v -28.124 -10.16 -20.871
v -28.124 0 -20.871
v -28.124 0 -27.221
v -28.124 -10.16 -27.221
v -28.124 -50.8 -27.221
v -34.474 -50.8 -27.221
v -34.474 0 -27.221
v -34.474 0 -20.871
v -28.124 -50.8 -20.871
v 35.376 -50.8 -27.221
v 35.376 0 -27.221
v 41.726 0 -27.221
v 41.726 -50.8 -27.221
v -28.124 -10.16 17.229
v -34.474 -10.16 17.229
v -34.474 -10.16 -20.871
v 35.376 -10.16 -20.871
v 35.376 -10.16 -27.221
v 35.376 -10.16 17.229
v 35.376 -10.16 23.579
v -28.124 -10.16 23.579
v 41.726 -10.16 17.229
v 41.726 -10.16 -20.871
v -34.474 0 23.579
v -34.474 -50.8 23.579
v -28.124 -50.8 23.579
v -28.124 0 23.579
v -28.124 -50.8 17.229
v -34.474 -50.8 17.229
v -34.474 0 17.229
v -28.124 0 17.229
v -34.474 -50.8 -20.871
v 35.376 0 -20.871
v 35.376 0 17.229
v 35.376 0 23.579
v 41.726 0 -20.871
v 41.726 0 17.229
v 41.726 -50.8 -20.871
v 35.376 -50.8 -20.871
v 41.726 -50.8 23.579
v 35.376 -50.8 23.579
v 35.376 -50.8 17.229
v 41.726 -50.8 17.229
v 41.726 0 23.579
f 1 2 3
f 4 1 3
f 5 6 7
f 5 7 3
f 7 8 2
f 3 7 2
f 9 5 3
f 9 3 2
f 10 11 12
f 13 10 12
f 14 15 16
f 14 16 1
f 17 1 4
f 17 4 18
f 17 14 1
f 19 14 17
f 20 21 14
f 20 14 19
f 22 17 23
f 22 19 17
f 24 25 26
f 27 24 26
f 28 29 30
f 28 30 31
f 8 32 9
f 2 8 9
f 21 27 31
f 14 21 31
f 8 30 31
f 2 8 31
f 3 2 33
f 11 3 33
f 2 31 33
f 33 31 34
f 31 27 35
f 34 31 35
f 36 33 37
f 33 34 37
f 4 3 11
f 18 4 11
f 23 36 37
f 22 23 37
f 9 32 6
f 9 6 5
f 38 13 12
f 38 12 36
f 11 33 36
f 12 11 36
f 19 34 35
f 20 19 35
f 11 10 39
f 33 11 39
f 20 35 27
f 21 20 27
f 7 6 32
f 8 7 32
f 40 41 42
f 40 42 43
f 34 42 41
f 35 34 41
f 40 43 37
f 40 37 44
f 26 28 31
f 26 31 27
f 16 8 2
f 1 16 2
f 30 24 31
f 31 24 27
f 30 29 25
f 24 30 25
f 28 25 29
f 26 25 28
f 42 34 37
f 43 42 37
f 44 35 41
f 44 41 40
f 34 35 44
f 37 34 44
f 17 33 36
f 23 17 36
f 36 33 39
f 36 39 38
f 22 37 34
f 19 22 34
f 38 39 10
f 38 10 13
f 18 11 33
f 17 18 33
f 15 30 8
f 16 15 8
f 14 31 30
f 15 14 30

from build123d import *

# Parameters (mm, degrees)
F0_W     = 6.35
F0_H     = 6.35
F1_DEPTH = 50.8
F2_DEPTH = 10.16


with BuildPart() as f1:
    # F0 (on Front) → F1 (new body)
    with BuildSketch(Plane.XZ):
        with Locations((-31.298816, 20.403551)):
            Rectangle(F0_W, F0_H)
        with Locations((38.551184, 20.403551)):
            Rectangle(F0_W, F0_H)
        with Locations((38.551184, -24.046449)):
            Rectangle(F0_W, F0_H)
        with Locations((-31.298816, -24.046449)):
            Rectangle(F0_W, F0_H)
    extrude(amount=F1_DEPTH)


with BuildPart() as f2:
    # F0 (on Front) → F2 (new body)
    with BuildSketch(Plane.XZ):
        Polygon((35.376184, 23.578551), (-28.123816, 23.578551), (-28.123816, 17.228551), (-34.473816, 17.228551), (-34.473816, -20.871449), (-28.123816, -20.871449), (-28.123816, -27.221449), (35.376184, -27.221449), (35.376184, -20.871449), (41.726184, -20.871449), (41.726184, 17.228551), (35.376184, 17.228551), align=None)
    extrude(amount=F2_DEPTH)


solid = Compound([f1.part, f2.part])
